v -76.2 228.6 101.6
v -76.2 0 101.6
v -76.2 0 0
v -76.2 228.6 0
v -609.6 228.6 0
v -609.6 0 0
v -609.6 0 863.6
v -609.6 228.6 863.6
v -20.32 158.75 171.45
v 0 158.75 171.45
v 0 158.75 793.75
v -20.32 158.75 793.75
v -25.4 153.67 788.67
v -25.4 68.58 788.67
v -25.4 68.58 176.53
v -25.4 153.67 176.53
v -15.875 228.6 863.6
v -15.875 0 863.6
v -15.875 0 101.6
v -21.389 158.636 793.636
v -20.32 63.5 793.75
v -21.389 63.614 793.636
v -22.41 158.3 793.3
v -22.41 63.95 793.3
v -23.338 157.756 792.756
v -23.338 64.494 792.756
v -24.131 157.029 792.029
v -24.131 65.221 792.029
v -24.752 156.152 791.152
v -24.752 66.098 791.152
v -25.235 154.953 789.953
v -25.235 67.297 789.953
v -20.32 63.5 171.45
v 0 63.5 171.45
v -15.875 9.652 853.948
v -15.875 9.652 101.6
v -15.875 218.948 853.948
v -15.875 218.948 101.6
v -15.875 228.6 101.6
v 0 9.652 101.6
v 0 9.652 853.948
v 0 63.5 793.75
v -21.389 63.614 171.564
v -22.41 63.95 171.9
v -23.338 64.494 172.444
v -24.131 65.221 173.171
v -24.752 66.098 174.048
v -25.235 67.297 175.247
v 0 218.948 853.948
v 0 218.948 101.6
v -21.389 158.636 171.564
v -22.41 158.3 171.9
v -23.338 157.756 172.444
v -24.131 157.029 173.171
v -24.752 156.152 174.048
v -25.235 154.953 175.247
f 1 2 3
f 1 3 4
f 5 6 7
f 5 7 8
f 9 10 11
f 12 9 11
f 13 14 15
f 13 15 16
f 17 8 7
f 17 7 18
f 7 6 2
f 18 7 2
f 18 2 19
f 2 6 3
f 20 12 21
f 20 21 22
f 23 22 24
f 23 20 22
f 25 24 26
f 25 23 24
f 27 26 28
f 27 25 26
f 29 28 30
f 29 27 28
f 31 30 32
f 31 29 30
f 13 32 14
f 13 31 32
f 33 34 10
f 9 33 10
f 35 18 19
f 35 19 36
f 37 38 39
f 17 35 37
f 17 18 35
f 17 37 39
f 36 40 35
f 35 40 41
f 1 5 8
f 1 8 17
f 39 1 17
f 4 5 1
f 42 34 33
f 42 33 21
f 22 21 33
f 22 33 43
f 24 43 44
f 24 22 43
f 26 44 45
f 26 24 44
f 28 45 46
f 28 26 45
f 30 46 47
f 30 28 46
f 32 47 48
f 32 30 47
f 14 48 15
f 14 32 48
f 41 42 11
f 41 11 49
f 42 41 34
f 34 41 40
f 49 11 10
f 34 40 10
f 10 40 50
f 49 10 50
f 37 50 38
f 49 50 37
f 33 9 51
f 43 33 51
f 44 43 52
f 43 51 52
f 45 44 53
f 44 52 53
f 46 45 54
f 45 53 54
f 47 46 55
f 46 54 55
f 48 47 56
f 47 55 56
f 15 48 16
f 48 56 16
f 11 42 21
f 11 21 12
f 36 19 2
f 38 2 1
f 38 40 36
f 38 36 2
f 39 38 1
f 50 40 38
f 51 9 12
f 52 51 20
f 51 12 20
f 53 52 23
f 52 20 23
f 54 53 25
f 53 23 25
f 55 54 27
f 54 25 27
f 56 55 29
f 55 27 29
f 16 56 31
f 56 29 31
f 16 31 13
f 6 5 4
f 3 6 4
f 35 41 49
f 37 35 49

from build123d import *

# Parameters (mm, degrees)
F0_W     = 609.6
F0_H     = 228.6
F1_DEPTH = 863.6
F2_W     = 95.25
F2_H     = 622.3
F3_DEPTH = 25.4
F4_R     = 5.08
F5_W     = 228.6
F5_H     = 101.6
F6_DEPTH = 76.2
F7_W     = 228.6
F7_H     = 778.857014
F7_W_2   = 209.296
F7_H_2   = 759.553014
F8_DEPTH = 15.875


with BuildPart() as f1:
    # F0 (on Top) → F1 (new body)
    with BuildSketch(Plane.XY):
        with Locations((-304.8, 114.3)):
            Rectangle(F0_W, F0_H)
    extrude(amount=F1_DEPTH)

    # F2 (on face) → F3 (cut)
    with BuildSketch(Plane.YZ):
        with Locations((111.125, 482.6)):
            Rectangle(F2_W, F2_H)
    extrude(amount=-F3_DEPTH, mode=Mode.SUBTRACT)

    # F4
    f4_edges = [f1.edges().sort_by_distance(p)[0] for p in [
        (-25.4, 158.75, 482.6),
        (-25.4, 111.125, 793.75),
        (-25.4, 63.5, 482.6),
        (-25.4, 111.125, 171.45),
    ]]
    fillet(f4_edges, radius=F4_R)

    # F5 (on face) → F6 (cut)
    with BuildSketch(Plane.YZ):
        with Locations((114.3, 50.8)):
            Rectangle(F5_W, F5_H)
    extrude(amount=-F6_DEPTH, mode=Mode.SUBTRACT)

    # F7 (on face) → F8 (cut)
    with BuildSketch(Plane.YZ):
        with Locations((114.3, 474.171493)):
            Rectangle(F7_W, F7_H)
        with Locations((114.3, 474.171493)):
            Rectangle(F7_W_2, F7_H_2, mode=Mode.SUBTRACT)
    extrude(amount=-F8_DEPTH, mode=Mode.SUBTRACT)


solid = f1.part
